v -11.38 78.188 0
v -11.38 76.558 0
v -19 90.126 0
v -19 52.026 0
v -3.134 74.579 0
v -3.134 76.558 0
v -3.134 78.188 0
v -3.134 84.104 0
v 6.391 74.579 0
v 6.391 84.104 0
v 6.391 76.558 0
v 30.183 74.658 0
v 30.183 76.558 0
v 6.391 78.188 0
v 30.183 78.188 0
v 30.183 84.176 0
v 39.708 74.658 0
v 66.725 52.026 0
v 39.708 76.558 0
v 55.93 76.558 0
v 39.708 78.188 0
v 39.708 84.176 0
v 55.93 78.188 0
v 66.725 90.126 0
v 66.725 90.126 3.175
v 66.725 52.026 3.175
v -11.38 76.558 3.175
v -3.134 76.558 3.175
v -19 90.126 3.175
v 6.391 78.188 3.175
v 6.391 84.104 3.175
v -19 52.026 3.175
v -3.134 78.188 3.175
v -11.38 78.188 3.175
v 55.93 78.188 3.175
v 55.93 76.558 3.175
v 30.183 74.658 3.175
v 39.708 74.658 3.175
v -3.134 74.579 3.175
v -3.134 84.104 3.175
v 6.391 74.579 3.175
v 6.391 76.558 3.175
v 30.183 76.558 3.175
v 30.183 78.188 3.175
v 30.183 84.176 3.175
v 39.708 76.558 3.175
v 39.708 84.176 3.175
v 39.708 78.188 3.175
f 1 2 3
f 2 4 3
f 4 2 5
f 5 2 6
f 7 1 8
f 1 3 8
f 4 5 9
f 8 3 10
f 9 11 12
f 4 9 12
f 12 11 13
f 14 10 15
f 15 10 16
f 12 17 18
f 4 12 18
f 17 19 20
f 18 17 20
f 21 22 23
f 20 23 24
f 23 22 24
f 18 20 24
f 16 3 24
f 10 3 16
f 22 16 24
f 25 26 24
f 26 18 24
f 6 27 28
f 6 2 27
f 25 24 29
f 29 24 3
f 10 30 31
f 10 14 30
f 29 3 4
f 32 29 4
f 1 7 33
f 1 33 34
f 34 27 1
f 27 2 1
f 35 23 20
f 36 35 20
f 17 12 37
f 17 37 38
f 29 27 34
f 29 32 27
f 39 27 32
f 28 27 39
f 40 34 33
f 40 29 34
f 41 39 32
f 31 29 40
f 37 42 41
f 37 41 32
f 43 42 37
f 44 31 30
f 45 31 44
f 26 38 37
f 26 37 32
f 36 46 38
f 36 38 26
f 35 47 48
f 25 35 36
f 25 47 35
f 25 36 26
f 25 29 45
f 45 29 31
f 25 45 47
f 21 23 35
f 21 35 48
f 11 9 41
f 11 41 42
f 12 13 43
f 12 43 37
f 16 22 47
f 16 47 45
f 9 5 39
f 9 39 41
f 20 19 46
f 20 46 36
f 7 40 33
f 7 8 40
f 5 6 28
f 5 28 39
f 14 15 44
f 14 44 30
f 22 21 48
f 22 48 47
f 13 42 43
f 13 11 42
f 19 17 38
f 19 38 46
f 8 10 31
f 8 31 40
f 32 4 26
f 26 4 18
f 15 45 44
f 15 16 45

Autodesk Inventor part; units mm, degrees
ref_plane "YZ Plane" through (0, 0, 0) normal (1, 0, 0) x (0, 1, 0)
ref_plane "XZ Plane" through (0, 0, 0) normal (0, 1, 0) x (-1, 0, 0)
ref_plane "XY Plane" through (0, 0, 0) normal (0, 0, 1) x (1, 0, 0)
sketch "Sketch1" plane through (0, 0, 0) normal (0, 0, 1) x (1, 0, 0)
  line L0 (66.7253, 90.1264) -> (-18.9997, 90.1264)
  line L1 (-18.9997, 90.1264) -> (-18.9997, 52.0264)
  line L2 (-18.9997, 52.0264) -> (66.7253, 52.0264)
  line L3 (66.7253, 52.0264) -> (66.7253, 90.1264)
  line L4 (66.7253, 78.1884) -> (-18.9997, 78.1884)
  line L5 (-18.9997, 78.1884) -> (-18.9997, 76.5584)
  line L6 (-18.9997, 76.5584) -> (66.7253, 76.5584)
  line L7 (66.7253, 76.5584) -> (66.7253, 78.1884)
  line L8 (55.9303, 78.1884) -> (55.9303, 76.5584)
  line L9 (-11.3797, 76.5584) -> (-11.3797, 78.1884)
  point P0 (0, 0)
  dimension "d0" = 38.1
  dimension "d1" = 85.725
  dimension "d2" = 1.63
  dimension "d3" = 11.938
  dimension "d6" = 67.31
  dimension "d7" = 7.62
extrude "Extrusion1" add sketch "Sketch1" along normal blind 3.175 contours L3 L4 L1 L0 | L3 L6 L8 L4 | L4 L9 L6 L1 | L3 L2 L1 L6
sketch "Sketch2" plane through (0, 0, 0) normal (0, 0, -1) x (-1, 0, 0)
  line L0 (-55.9303, 78.1884) -> (11.3797, 78.1884) projected
  line L1 (-6.3913, 84.1043) -> (3.1337, 84.1043)
  line L2 (3.1337, 84.1043) -> (3.1337, 74.5793)
  line L3 (3.1337, 74.5793) -> (-6.3913, 74.5793)
  line L4 (-6.3913, 74.5793) -> (-6.3913, 84.1043)
  line L5 (-39.708, 84.1761) -> (-30.183, 84.1761)
  line L6 (-30.183, 84.1761) -> (-30.183, 74.6584)
  line L7 (-30.183, 74.6584) -> (-39.708, 74.6584)
  line L8 (-39.708, 74.6584) -> (-39.708, 84.1761)
  line L9 (18.9997, 52.0264) -> (-66.7253, 52.0264) projected
  line L10 (-50.8503, 52.0264) -> (-12.7503, 52.0264)
  line L11 (-66.7253, 90.1264) -> (18.9997, 90.1264) projected
  line L12 (-28.6253, 90.1264) -> (-15.9253, 90.1264)
  point P0 (0, 0)
  dimension "d8" = 9.525
  dimension "d9" = 9.5177
  dimension "d10" = 9.525
  dimension "d11" = 9.525
  dimension "d13" = 5.9159
extrude "Extrusion2" cut sketch "Sketch2" against normal blind 3.175
properties part number "FrontBulkhead"
